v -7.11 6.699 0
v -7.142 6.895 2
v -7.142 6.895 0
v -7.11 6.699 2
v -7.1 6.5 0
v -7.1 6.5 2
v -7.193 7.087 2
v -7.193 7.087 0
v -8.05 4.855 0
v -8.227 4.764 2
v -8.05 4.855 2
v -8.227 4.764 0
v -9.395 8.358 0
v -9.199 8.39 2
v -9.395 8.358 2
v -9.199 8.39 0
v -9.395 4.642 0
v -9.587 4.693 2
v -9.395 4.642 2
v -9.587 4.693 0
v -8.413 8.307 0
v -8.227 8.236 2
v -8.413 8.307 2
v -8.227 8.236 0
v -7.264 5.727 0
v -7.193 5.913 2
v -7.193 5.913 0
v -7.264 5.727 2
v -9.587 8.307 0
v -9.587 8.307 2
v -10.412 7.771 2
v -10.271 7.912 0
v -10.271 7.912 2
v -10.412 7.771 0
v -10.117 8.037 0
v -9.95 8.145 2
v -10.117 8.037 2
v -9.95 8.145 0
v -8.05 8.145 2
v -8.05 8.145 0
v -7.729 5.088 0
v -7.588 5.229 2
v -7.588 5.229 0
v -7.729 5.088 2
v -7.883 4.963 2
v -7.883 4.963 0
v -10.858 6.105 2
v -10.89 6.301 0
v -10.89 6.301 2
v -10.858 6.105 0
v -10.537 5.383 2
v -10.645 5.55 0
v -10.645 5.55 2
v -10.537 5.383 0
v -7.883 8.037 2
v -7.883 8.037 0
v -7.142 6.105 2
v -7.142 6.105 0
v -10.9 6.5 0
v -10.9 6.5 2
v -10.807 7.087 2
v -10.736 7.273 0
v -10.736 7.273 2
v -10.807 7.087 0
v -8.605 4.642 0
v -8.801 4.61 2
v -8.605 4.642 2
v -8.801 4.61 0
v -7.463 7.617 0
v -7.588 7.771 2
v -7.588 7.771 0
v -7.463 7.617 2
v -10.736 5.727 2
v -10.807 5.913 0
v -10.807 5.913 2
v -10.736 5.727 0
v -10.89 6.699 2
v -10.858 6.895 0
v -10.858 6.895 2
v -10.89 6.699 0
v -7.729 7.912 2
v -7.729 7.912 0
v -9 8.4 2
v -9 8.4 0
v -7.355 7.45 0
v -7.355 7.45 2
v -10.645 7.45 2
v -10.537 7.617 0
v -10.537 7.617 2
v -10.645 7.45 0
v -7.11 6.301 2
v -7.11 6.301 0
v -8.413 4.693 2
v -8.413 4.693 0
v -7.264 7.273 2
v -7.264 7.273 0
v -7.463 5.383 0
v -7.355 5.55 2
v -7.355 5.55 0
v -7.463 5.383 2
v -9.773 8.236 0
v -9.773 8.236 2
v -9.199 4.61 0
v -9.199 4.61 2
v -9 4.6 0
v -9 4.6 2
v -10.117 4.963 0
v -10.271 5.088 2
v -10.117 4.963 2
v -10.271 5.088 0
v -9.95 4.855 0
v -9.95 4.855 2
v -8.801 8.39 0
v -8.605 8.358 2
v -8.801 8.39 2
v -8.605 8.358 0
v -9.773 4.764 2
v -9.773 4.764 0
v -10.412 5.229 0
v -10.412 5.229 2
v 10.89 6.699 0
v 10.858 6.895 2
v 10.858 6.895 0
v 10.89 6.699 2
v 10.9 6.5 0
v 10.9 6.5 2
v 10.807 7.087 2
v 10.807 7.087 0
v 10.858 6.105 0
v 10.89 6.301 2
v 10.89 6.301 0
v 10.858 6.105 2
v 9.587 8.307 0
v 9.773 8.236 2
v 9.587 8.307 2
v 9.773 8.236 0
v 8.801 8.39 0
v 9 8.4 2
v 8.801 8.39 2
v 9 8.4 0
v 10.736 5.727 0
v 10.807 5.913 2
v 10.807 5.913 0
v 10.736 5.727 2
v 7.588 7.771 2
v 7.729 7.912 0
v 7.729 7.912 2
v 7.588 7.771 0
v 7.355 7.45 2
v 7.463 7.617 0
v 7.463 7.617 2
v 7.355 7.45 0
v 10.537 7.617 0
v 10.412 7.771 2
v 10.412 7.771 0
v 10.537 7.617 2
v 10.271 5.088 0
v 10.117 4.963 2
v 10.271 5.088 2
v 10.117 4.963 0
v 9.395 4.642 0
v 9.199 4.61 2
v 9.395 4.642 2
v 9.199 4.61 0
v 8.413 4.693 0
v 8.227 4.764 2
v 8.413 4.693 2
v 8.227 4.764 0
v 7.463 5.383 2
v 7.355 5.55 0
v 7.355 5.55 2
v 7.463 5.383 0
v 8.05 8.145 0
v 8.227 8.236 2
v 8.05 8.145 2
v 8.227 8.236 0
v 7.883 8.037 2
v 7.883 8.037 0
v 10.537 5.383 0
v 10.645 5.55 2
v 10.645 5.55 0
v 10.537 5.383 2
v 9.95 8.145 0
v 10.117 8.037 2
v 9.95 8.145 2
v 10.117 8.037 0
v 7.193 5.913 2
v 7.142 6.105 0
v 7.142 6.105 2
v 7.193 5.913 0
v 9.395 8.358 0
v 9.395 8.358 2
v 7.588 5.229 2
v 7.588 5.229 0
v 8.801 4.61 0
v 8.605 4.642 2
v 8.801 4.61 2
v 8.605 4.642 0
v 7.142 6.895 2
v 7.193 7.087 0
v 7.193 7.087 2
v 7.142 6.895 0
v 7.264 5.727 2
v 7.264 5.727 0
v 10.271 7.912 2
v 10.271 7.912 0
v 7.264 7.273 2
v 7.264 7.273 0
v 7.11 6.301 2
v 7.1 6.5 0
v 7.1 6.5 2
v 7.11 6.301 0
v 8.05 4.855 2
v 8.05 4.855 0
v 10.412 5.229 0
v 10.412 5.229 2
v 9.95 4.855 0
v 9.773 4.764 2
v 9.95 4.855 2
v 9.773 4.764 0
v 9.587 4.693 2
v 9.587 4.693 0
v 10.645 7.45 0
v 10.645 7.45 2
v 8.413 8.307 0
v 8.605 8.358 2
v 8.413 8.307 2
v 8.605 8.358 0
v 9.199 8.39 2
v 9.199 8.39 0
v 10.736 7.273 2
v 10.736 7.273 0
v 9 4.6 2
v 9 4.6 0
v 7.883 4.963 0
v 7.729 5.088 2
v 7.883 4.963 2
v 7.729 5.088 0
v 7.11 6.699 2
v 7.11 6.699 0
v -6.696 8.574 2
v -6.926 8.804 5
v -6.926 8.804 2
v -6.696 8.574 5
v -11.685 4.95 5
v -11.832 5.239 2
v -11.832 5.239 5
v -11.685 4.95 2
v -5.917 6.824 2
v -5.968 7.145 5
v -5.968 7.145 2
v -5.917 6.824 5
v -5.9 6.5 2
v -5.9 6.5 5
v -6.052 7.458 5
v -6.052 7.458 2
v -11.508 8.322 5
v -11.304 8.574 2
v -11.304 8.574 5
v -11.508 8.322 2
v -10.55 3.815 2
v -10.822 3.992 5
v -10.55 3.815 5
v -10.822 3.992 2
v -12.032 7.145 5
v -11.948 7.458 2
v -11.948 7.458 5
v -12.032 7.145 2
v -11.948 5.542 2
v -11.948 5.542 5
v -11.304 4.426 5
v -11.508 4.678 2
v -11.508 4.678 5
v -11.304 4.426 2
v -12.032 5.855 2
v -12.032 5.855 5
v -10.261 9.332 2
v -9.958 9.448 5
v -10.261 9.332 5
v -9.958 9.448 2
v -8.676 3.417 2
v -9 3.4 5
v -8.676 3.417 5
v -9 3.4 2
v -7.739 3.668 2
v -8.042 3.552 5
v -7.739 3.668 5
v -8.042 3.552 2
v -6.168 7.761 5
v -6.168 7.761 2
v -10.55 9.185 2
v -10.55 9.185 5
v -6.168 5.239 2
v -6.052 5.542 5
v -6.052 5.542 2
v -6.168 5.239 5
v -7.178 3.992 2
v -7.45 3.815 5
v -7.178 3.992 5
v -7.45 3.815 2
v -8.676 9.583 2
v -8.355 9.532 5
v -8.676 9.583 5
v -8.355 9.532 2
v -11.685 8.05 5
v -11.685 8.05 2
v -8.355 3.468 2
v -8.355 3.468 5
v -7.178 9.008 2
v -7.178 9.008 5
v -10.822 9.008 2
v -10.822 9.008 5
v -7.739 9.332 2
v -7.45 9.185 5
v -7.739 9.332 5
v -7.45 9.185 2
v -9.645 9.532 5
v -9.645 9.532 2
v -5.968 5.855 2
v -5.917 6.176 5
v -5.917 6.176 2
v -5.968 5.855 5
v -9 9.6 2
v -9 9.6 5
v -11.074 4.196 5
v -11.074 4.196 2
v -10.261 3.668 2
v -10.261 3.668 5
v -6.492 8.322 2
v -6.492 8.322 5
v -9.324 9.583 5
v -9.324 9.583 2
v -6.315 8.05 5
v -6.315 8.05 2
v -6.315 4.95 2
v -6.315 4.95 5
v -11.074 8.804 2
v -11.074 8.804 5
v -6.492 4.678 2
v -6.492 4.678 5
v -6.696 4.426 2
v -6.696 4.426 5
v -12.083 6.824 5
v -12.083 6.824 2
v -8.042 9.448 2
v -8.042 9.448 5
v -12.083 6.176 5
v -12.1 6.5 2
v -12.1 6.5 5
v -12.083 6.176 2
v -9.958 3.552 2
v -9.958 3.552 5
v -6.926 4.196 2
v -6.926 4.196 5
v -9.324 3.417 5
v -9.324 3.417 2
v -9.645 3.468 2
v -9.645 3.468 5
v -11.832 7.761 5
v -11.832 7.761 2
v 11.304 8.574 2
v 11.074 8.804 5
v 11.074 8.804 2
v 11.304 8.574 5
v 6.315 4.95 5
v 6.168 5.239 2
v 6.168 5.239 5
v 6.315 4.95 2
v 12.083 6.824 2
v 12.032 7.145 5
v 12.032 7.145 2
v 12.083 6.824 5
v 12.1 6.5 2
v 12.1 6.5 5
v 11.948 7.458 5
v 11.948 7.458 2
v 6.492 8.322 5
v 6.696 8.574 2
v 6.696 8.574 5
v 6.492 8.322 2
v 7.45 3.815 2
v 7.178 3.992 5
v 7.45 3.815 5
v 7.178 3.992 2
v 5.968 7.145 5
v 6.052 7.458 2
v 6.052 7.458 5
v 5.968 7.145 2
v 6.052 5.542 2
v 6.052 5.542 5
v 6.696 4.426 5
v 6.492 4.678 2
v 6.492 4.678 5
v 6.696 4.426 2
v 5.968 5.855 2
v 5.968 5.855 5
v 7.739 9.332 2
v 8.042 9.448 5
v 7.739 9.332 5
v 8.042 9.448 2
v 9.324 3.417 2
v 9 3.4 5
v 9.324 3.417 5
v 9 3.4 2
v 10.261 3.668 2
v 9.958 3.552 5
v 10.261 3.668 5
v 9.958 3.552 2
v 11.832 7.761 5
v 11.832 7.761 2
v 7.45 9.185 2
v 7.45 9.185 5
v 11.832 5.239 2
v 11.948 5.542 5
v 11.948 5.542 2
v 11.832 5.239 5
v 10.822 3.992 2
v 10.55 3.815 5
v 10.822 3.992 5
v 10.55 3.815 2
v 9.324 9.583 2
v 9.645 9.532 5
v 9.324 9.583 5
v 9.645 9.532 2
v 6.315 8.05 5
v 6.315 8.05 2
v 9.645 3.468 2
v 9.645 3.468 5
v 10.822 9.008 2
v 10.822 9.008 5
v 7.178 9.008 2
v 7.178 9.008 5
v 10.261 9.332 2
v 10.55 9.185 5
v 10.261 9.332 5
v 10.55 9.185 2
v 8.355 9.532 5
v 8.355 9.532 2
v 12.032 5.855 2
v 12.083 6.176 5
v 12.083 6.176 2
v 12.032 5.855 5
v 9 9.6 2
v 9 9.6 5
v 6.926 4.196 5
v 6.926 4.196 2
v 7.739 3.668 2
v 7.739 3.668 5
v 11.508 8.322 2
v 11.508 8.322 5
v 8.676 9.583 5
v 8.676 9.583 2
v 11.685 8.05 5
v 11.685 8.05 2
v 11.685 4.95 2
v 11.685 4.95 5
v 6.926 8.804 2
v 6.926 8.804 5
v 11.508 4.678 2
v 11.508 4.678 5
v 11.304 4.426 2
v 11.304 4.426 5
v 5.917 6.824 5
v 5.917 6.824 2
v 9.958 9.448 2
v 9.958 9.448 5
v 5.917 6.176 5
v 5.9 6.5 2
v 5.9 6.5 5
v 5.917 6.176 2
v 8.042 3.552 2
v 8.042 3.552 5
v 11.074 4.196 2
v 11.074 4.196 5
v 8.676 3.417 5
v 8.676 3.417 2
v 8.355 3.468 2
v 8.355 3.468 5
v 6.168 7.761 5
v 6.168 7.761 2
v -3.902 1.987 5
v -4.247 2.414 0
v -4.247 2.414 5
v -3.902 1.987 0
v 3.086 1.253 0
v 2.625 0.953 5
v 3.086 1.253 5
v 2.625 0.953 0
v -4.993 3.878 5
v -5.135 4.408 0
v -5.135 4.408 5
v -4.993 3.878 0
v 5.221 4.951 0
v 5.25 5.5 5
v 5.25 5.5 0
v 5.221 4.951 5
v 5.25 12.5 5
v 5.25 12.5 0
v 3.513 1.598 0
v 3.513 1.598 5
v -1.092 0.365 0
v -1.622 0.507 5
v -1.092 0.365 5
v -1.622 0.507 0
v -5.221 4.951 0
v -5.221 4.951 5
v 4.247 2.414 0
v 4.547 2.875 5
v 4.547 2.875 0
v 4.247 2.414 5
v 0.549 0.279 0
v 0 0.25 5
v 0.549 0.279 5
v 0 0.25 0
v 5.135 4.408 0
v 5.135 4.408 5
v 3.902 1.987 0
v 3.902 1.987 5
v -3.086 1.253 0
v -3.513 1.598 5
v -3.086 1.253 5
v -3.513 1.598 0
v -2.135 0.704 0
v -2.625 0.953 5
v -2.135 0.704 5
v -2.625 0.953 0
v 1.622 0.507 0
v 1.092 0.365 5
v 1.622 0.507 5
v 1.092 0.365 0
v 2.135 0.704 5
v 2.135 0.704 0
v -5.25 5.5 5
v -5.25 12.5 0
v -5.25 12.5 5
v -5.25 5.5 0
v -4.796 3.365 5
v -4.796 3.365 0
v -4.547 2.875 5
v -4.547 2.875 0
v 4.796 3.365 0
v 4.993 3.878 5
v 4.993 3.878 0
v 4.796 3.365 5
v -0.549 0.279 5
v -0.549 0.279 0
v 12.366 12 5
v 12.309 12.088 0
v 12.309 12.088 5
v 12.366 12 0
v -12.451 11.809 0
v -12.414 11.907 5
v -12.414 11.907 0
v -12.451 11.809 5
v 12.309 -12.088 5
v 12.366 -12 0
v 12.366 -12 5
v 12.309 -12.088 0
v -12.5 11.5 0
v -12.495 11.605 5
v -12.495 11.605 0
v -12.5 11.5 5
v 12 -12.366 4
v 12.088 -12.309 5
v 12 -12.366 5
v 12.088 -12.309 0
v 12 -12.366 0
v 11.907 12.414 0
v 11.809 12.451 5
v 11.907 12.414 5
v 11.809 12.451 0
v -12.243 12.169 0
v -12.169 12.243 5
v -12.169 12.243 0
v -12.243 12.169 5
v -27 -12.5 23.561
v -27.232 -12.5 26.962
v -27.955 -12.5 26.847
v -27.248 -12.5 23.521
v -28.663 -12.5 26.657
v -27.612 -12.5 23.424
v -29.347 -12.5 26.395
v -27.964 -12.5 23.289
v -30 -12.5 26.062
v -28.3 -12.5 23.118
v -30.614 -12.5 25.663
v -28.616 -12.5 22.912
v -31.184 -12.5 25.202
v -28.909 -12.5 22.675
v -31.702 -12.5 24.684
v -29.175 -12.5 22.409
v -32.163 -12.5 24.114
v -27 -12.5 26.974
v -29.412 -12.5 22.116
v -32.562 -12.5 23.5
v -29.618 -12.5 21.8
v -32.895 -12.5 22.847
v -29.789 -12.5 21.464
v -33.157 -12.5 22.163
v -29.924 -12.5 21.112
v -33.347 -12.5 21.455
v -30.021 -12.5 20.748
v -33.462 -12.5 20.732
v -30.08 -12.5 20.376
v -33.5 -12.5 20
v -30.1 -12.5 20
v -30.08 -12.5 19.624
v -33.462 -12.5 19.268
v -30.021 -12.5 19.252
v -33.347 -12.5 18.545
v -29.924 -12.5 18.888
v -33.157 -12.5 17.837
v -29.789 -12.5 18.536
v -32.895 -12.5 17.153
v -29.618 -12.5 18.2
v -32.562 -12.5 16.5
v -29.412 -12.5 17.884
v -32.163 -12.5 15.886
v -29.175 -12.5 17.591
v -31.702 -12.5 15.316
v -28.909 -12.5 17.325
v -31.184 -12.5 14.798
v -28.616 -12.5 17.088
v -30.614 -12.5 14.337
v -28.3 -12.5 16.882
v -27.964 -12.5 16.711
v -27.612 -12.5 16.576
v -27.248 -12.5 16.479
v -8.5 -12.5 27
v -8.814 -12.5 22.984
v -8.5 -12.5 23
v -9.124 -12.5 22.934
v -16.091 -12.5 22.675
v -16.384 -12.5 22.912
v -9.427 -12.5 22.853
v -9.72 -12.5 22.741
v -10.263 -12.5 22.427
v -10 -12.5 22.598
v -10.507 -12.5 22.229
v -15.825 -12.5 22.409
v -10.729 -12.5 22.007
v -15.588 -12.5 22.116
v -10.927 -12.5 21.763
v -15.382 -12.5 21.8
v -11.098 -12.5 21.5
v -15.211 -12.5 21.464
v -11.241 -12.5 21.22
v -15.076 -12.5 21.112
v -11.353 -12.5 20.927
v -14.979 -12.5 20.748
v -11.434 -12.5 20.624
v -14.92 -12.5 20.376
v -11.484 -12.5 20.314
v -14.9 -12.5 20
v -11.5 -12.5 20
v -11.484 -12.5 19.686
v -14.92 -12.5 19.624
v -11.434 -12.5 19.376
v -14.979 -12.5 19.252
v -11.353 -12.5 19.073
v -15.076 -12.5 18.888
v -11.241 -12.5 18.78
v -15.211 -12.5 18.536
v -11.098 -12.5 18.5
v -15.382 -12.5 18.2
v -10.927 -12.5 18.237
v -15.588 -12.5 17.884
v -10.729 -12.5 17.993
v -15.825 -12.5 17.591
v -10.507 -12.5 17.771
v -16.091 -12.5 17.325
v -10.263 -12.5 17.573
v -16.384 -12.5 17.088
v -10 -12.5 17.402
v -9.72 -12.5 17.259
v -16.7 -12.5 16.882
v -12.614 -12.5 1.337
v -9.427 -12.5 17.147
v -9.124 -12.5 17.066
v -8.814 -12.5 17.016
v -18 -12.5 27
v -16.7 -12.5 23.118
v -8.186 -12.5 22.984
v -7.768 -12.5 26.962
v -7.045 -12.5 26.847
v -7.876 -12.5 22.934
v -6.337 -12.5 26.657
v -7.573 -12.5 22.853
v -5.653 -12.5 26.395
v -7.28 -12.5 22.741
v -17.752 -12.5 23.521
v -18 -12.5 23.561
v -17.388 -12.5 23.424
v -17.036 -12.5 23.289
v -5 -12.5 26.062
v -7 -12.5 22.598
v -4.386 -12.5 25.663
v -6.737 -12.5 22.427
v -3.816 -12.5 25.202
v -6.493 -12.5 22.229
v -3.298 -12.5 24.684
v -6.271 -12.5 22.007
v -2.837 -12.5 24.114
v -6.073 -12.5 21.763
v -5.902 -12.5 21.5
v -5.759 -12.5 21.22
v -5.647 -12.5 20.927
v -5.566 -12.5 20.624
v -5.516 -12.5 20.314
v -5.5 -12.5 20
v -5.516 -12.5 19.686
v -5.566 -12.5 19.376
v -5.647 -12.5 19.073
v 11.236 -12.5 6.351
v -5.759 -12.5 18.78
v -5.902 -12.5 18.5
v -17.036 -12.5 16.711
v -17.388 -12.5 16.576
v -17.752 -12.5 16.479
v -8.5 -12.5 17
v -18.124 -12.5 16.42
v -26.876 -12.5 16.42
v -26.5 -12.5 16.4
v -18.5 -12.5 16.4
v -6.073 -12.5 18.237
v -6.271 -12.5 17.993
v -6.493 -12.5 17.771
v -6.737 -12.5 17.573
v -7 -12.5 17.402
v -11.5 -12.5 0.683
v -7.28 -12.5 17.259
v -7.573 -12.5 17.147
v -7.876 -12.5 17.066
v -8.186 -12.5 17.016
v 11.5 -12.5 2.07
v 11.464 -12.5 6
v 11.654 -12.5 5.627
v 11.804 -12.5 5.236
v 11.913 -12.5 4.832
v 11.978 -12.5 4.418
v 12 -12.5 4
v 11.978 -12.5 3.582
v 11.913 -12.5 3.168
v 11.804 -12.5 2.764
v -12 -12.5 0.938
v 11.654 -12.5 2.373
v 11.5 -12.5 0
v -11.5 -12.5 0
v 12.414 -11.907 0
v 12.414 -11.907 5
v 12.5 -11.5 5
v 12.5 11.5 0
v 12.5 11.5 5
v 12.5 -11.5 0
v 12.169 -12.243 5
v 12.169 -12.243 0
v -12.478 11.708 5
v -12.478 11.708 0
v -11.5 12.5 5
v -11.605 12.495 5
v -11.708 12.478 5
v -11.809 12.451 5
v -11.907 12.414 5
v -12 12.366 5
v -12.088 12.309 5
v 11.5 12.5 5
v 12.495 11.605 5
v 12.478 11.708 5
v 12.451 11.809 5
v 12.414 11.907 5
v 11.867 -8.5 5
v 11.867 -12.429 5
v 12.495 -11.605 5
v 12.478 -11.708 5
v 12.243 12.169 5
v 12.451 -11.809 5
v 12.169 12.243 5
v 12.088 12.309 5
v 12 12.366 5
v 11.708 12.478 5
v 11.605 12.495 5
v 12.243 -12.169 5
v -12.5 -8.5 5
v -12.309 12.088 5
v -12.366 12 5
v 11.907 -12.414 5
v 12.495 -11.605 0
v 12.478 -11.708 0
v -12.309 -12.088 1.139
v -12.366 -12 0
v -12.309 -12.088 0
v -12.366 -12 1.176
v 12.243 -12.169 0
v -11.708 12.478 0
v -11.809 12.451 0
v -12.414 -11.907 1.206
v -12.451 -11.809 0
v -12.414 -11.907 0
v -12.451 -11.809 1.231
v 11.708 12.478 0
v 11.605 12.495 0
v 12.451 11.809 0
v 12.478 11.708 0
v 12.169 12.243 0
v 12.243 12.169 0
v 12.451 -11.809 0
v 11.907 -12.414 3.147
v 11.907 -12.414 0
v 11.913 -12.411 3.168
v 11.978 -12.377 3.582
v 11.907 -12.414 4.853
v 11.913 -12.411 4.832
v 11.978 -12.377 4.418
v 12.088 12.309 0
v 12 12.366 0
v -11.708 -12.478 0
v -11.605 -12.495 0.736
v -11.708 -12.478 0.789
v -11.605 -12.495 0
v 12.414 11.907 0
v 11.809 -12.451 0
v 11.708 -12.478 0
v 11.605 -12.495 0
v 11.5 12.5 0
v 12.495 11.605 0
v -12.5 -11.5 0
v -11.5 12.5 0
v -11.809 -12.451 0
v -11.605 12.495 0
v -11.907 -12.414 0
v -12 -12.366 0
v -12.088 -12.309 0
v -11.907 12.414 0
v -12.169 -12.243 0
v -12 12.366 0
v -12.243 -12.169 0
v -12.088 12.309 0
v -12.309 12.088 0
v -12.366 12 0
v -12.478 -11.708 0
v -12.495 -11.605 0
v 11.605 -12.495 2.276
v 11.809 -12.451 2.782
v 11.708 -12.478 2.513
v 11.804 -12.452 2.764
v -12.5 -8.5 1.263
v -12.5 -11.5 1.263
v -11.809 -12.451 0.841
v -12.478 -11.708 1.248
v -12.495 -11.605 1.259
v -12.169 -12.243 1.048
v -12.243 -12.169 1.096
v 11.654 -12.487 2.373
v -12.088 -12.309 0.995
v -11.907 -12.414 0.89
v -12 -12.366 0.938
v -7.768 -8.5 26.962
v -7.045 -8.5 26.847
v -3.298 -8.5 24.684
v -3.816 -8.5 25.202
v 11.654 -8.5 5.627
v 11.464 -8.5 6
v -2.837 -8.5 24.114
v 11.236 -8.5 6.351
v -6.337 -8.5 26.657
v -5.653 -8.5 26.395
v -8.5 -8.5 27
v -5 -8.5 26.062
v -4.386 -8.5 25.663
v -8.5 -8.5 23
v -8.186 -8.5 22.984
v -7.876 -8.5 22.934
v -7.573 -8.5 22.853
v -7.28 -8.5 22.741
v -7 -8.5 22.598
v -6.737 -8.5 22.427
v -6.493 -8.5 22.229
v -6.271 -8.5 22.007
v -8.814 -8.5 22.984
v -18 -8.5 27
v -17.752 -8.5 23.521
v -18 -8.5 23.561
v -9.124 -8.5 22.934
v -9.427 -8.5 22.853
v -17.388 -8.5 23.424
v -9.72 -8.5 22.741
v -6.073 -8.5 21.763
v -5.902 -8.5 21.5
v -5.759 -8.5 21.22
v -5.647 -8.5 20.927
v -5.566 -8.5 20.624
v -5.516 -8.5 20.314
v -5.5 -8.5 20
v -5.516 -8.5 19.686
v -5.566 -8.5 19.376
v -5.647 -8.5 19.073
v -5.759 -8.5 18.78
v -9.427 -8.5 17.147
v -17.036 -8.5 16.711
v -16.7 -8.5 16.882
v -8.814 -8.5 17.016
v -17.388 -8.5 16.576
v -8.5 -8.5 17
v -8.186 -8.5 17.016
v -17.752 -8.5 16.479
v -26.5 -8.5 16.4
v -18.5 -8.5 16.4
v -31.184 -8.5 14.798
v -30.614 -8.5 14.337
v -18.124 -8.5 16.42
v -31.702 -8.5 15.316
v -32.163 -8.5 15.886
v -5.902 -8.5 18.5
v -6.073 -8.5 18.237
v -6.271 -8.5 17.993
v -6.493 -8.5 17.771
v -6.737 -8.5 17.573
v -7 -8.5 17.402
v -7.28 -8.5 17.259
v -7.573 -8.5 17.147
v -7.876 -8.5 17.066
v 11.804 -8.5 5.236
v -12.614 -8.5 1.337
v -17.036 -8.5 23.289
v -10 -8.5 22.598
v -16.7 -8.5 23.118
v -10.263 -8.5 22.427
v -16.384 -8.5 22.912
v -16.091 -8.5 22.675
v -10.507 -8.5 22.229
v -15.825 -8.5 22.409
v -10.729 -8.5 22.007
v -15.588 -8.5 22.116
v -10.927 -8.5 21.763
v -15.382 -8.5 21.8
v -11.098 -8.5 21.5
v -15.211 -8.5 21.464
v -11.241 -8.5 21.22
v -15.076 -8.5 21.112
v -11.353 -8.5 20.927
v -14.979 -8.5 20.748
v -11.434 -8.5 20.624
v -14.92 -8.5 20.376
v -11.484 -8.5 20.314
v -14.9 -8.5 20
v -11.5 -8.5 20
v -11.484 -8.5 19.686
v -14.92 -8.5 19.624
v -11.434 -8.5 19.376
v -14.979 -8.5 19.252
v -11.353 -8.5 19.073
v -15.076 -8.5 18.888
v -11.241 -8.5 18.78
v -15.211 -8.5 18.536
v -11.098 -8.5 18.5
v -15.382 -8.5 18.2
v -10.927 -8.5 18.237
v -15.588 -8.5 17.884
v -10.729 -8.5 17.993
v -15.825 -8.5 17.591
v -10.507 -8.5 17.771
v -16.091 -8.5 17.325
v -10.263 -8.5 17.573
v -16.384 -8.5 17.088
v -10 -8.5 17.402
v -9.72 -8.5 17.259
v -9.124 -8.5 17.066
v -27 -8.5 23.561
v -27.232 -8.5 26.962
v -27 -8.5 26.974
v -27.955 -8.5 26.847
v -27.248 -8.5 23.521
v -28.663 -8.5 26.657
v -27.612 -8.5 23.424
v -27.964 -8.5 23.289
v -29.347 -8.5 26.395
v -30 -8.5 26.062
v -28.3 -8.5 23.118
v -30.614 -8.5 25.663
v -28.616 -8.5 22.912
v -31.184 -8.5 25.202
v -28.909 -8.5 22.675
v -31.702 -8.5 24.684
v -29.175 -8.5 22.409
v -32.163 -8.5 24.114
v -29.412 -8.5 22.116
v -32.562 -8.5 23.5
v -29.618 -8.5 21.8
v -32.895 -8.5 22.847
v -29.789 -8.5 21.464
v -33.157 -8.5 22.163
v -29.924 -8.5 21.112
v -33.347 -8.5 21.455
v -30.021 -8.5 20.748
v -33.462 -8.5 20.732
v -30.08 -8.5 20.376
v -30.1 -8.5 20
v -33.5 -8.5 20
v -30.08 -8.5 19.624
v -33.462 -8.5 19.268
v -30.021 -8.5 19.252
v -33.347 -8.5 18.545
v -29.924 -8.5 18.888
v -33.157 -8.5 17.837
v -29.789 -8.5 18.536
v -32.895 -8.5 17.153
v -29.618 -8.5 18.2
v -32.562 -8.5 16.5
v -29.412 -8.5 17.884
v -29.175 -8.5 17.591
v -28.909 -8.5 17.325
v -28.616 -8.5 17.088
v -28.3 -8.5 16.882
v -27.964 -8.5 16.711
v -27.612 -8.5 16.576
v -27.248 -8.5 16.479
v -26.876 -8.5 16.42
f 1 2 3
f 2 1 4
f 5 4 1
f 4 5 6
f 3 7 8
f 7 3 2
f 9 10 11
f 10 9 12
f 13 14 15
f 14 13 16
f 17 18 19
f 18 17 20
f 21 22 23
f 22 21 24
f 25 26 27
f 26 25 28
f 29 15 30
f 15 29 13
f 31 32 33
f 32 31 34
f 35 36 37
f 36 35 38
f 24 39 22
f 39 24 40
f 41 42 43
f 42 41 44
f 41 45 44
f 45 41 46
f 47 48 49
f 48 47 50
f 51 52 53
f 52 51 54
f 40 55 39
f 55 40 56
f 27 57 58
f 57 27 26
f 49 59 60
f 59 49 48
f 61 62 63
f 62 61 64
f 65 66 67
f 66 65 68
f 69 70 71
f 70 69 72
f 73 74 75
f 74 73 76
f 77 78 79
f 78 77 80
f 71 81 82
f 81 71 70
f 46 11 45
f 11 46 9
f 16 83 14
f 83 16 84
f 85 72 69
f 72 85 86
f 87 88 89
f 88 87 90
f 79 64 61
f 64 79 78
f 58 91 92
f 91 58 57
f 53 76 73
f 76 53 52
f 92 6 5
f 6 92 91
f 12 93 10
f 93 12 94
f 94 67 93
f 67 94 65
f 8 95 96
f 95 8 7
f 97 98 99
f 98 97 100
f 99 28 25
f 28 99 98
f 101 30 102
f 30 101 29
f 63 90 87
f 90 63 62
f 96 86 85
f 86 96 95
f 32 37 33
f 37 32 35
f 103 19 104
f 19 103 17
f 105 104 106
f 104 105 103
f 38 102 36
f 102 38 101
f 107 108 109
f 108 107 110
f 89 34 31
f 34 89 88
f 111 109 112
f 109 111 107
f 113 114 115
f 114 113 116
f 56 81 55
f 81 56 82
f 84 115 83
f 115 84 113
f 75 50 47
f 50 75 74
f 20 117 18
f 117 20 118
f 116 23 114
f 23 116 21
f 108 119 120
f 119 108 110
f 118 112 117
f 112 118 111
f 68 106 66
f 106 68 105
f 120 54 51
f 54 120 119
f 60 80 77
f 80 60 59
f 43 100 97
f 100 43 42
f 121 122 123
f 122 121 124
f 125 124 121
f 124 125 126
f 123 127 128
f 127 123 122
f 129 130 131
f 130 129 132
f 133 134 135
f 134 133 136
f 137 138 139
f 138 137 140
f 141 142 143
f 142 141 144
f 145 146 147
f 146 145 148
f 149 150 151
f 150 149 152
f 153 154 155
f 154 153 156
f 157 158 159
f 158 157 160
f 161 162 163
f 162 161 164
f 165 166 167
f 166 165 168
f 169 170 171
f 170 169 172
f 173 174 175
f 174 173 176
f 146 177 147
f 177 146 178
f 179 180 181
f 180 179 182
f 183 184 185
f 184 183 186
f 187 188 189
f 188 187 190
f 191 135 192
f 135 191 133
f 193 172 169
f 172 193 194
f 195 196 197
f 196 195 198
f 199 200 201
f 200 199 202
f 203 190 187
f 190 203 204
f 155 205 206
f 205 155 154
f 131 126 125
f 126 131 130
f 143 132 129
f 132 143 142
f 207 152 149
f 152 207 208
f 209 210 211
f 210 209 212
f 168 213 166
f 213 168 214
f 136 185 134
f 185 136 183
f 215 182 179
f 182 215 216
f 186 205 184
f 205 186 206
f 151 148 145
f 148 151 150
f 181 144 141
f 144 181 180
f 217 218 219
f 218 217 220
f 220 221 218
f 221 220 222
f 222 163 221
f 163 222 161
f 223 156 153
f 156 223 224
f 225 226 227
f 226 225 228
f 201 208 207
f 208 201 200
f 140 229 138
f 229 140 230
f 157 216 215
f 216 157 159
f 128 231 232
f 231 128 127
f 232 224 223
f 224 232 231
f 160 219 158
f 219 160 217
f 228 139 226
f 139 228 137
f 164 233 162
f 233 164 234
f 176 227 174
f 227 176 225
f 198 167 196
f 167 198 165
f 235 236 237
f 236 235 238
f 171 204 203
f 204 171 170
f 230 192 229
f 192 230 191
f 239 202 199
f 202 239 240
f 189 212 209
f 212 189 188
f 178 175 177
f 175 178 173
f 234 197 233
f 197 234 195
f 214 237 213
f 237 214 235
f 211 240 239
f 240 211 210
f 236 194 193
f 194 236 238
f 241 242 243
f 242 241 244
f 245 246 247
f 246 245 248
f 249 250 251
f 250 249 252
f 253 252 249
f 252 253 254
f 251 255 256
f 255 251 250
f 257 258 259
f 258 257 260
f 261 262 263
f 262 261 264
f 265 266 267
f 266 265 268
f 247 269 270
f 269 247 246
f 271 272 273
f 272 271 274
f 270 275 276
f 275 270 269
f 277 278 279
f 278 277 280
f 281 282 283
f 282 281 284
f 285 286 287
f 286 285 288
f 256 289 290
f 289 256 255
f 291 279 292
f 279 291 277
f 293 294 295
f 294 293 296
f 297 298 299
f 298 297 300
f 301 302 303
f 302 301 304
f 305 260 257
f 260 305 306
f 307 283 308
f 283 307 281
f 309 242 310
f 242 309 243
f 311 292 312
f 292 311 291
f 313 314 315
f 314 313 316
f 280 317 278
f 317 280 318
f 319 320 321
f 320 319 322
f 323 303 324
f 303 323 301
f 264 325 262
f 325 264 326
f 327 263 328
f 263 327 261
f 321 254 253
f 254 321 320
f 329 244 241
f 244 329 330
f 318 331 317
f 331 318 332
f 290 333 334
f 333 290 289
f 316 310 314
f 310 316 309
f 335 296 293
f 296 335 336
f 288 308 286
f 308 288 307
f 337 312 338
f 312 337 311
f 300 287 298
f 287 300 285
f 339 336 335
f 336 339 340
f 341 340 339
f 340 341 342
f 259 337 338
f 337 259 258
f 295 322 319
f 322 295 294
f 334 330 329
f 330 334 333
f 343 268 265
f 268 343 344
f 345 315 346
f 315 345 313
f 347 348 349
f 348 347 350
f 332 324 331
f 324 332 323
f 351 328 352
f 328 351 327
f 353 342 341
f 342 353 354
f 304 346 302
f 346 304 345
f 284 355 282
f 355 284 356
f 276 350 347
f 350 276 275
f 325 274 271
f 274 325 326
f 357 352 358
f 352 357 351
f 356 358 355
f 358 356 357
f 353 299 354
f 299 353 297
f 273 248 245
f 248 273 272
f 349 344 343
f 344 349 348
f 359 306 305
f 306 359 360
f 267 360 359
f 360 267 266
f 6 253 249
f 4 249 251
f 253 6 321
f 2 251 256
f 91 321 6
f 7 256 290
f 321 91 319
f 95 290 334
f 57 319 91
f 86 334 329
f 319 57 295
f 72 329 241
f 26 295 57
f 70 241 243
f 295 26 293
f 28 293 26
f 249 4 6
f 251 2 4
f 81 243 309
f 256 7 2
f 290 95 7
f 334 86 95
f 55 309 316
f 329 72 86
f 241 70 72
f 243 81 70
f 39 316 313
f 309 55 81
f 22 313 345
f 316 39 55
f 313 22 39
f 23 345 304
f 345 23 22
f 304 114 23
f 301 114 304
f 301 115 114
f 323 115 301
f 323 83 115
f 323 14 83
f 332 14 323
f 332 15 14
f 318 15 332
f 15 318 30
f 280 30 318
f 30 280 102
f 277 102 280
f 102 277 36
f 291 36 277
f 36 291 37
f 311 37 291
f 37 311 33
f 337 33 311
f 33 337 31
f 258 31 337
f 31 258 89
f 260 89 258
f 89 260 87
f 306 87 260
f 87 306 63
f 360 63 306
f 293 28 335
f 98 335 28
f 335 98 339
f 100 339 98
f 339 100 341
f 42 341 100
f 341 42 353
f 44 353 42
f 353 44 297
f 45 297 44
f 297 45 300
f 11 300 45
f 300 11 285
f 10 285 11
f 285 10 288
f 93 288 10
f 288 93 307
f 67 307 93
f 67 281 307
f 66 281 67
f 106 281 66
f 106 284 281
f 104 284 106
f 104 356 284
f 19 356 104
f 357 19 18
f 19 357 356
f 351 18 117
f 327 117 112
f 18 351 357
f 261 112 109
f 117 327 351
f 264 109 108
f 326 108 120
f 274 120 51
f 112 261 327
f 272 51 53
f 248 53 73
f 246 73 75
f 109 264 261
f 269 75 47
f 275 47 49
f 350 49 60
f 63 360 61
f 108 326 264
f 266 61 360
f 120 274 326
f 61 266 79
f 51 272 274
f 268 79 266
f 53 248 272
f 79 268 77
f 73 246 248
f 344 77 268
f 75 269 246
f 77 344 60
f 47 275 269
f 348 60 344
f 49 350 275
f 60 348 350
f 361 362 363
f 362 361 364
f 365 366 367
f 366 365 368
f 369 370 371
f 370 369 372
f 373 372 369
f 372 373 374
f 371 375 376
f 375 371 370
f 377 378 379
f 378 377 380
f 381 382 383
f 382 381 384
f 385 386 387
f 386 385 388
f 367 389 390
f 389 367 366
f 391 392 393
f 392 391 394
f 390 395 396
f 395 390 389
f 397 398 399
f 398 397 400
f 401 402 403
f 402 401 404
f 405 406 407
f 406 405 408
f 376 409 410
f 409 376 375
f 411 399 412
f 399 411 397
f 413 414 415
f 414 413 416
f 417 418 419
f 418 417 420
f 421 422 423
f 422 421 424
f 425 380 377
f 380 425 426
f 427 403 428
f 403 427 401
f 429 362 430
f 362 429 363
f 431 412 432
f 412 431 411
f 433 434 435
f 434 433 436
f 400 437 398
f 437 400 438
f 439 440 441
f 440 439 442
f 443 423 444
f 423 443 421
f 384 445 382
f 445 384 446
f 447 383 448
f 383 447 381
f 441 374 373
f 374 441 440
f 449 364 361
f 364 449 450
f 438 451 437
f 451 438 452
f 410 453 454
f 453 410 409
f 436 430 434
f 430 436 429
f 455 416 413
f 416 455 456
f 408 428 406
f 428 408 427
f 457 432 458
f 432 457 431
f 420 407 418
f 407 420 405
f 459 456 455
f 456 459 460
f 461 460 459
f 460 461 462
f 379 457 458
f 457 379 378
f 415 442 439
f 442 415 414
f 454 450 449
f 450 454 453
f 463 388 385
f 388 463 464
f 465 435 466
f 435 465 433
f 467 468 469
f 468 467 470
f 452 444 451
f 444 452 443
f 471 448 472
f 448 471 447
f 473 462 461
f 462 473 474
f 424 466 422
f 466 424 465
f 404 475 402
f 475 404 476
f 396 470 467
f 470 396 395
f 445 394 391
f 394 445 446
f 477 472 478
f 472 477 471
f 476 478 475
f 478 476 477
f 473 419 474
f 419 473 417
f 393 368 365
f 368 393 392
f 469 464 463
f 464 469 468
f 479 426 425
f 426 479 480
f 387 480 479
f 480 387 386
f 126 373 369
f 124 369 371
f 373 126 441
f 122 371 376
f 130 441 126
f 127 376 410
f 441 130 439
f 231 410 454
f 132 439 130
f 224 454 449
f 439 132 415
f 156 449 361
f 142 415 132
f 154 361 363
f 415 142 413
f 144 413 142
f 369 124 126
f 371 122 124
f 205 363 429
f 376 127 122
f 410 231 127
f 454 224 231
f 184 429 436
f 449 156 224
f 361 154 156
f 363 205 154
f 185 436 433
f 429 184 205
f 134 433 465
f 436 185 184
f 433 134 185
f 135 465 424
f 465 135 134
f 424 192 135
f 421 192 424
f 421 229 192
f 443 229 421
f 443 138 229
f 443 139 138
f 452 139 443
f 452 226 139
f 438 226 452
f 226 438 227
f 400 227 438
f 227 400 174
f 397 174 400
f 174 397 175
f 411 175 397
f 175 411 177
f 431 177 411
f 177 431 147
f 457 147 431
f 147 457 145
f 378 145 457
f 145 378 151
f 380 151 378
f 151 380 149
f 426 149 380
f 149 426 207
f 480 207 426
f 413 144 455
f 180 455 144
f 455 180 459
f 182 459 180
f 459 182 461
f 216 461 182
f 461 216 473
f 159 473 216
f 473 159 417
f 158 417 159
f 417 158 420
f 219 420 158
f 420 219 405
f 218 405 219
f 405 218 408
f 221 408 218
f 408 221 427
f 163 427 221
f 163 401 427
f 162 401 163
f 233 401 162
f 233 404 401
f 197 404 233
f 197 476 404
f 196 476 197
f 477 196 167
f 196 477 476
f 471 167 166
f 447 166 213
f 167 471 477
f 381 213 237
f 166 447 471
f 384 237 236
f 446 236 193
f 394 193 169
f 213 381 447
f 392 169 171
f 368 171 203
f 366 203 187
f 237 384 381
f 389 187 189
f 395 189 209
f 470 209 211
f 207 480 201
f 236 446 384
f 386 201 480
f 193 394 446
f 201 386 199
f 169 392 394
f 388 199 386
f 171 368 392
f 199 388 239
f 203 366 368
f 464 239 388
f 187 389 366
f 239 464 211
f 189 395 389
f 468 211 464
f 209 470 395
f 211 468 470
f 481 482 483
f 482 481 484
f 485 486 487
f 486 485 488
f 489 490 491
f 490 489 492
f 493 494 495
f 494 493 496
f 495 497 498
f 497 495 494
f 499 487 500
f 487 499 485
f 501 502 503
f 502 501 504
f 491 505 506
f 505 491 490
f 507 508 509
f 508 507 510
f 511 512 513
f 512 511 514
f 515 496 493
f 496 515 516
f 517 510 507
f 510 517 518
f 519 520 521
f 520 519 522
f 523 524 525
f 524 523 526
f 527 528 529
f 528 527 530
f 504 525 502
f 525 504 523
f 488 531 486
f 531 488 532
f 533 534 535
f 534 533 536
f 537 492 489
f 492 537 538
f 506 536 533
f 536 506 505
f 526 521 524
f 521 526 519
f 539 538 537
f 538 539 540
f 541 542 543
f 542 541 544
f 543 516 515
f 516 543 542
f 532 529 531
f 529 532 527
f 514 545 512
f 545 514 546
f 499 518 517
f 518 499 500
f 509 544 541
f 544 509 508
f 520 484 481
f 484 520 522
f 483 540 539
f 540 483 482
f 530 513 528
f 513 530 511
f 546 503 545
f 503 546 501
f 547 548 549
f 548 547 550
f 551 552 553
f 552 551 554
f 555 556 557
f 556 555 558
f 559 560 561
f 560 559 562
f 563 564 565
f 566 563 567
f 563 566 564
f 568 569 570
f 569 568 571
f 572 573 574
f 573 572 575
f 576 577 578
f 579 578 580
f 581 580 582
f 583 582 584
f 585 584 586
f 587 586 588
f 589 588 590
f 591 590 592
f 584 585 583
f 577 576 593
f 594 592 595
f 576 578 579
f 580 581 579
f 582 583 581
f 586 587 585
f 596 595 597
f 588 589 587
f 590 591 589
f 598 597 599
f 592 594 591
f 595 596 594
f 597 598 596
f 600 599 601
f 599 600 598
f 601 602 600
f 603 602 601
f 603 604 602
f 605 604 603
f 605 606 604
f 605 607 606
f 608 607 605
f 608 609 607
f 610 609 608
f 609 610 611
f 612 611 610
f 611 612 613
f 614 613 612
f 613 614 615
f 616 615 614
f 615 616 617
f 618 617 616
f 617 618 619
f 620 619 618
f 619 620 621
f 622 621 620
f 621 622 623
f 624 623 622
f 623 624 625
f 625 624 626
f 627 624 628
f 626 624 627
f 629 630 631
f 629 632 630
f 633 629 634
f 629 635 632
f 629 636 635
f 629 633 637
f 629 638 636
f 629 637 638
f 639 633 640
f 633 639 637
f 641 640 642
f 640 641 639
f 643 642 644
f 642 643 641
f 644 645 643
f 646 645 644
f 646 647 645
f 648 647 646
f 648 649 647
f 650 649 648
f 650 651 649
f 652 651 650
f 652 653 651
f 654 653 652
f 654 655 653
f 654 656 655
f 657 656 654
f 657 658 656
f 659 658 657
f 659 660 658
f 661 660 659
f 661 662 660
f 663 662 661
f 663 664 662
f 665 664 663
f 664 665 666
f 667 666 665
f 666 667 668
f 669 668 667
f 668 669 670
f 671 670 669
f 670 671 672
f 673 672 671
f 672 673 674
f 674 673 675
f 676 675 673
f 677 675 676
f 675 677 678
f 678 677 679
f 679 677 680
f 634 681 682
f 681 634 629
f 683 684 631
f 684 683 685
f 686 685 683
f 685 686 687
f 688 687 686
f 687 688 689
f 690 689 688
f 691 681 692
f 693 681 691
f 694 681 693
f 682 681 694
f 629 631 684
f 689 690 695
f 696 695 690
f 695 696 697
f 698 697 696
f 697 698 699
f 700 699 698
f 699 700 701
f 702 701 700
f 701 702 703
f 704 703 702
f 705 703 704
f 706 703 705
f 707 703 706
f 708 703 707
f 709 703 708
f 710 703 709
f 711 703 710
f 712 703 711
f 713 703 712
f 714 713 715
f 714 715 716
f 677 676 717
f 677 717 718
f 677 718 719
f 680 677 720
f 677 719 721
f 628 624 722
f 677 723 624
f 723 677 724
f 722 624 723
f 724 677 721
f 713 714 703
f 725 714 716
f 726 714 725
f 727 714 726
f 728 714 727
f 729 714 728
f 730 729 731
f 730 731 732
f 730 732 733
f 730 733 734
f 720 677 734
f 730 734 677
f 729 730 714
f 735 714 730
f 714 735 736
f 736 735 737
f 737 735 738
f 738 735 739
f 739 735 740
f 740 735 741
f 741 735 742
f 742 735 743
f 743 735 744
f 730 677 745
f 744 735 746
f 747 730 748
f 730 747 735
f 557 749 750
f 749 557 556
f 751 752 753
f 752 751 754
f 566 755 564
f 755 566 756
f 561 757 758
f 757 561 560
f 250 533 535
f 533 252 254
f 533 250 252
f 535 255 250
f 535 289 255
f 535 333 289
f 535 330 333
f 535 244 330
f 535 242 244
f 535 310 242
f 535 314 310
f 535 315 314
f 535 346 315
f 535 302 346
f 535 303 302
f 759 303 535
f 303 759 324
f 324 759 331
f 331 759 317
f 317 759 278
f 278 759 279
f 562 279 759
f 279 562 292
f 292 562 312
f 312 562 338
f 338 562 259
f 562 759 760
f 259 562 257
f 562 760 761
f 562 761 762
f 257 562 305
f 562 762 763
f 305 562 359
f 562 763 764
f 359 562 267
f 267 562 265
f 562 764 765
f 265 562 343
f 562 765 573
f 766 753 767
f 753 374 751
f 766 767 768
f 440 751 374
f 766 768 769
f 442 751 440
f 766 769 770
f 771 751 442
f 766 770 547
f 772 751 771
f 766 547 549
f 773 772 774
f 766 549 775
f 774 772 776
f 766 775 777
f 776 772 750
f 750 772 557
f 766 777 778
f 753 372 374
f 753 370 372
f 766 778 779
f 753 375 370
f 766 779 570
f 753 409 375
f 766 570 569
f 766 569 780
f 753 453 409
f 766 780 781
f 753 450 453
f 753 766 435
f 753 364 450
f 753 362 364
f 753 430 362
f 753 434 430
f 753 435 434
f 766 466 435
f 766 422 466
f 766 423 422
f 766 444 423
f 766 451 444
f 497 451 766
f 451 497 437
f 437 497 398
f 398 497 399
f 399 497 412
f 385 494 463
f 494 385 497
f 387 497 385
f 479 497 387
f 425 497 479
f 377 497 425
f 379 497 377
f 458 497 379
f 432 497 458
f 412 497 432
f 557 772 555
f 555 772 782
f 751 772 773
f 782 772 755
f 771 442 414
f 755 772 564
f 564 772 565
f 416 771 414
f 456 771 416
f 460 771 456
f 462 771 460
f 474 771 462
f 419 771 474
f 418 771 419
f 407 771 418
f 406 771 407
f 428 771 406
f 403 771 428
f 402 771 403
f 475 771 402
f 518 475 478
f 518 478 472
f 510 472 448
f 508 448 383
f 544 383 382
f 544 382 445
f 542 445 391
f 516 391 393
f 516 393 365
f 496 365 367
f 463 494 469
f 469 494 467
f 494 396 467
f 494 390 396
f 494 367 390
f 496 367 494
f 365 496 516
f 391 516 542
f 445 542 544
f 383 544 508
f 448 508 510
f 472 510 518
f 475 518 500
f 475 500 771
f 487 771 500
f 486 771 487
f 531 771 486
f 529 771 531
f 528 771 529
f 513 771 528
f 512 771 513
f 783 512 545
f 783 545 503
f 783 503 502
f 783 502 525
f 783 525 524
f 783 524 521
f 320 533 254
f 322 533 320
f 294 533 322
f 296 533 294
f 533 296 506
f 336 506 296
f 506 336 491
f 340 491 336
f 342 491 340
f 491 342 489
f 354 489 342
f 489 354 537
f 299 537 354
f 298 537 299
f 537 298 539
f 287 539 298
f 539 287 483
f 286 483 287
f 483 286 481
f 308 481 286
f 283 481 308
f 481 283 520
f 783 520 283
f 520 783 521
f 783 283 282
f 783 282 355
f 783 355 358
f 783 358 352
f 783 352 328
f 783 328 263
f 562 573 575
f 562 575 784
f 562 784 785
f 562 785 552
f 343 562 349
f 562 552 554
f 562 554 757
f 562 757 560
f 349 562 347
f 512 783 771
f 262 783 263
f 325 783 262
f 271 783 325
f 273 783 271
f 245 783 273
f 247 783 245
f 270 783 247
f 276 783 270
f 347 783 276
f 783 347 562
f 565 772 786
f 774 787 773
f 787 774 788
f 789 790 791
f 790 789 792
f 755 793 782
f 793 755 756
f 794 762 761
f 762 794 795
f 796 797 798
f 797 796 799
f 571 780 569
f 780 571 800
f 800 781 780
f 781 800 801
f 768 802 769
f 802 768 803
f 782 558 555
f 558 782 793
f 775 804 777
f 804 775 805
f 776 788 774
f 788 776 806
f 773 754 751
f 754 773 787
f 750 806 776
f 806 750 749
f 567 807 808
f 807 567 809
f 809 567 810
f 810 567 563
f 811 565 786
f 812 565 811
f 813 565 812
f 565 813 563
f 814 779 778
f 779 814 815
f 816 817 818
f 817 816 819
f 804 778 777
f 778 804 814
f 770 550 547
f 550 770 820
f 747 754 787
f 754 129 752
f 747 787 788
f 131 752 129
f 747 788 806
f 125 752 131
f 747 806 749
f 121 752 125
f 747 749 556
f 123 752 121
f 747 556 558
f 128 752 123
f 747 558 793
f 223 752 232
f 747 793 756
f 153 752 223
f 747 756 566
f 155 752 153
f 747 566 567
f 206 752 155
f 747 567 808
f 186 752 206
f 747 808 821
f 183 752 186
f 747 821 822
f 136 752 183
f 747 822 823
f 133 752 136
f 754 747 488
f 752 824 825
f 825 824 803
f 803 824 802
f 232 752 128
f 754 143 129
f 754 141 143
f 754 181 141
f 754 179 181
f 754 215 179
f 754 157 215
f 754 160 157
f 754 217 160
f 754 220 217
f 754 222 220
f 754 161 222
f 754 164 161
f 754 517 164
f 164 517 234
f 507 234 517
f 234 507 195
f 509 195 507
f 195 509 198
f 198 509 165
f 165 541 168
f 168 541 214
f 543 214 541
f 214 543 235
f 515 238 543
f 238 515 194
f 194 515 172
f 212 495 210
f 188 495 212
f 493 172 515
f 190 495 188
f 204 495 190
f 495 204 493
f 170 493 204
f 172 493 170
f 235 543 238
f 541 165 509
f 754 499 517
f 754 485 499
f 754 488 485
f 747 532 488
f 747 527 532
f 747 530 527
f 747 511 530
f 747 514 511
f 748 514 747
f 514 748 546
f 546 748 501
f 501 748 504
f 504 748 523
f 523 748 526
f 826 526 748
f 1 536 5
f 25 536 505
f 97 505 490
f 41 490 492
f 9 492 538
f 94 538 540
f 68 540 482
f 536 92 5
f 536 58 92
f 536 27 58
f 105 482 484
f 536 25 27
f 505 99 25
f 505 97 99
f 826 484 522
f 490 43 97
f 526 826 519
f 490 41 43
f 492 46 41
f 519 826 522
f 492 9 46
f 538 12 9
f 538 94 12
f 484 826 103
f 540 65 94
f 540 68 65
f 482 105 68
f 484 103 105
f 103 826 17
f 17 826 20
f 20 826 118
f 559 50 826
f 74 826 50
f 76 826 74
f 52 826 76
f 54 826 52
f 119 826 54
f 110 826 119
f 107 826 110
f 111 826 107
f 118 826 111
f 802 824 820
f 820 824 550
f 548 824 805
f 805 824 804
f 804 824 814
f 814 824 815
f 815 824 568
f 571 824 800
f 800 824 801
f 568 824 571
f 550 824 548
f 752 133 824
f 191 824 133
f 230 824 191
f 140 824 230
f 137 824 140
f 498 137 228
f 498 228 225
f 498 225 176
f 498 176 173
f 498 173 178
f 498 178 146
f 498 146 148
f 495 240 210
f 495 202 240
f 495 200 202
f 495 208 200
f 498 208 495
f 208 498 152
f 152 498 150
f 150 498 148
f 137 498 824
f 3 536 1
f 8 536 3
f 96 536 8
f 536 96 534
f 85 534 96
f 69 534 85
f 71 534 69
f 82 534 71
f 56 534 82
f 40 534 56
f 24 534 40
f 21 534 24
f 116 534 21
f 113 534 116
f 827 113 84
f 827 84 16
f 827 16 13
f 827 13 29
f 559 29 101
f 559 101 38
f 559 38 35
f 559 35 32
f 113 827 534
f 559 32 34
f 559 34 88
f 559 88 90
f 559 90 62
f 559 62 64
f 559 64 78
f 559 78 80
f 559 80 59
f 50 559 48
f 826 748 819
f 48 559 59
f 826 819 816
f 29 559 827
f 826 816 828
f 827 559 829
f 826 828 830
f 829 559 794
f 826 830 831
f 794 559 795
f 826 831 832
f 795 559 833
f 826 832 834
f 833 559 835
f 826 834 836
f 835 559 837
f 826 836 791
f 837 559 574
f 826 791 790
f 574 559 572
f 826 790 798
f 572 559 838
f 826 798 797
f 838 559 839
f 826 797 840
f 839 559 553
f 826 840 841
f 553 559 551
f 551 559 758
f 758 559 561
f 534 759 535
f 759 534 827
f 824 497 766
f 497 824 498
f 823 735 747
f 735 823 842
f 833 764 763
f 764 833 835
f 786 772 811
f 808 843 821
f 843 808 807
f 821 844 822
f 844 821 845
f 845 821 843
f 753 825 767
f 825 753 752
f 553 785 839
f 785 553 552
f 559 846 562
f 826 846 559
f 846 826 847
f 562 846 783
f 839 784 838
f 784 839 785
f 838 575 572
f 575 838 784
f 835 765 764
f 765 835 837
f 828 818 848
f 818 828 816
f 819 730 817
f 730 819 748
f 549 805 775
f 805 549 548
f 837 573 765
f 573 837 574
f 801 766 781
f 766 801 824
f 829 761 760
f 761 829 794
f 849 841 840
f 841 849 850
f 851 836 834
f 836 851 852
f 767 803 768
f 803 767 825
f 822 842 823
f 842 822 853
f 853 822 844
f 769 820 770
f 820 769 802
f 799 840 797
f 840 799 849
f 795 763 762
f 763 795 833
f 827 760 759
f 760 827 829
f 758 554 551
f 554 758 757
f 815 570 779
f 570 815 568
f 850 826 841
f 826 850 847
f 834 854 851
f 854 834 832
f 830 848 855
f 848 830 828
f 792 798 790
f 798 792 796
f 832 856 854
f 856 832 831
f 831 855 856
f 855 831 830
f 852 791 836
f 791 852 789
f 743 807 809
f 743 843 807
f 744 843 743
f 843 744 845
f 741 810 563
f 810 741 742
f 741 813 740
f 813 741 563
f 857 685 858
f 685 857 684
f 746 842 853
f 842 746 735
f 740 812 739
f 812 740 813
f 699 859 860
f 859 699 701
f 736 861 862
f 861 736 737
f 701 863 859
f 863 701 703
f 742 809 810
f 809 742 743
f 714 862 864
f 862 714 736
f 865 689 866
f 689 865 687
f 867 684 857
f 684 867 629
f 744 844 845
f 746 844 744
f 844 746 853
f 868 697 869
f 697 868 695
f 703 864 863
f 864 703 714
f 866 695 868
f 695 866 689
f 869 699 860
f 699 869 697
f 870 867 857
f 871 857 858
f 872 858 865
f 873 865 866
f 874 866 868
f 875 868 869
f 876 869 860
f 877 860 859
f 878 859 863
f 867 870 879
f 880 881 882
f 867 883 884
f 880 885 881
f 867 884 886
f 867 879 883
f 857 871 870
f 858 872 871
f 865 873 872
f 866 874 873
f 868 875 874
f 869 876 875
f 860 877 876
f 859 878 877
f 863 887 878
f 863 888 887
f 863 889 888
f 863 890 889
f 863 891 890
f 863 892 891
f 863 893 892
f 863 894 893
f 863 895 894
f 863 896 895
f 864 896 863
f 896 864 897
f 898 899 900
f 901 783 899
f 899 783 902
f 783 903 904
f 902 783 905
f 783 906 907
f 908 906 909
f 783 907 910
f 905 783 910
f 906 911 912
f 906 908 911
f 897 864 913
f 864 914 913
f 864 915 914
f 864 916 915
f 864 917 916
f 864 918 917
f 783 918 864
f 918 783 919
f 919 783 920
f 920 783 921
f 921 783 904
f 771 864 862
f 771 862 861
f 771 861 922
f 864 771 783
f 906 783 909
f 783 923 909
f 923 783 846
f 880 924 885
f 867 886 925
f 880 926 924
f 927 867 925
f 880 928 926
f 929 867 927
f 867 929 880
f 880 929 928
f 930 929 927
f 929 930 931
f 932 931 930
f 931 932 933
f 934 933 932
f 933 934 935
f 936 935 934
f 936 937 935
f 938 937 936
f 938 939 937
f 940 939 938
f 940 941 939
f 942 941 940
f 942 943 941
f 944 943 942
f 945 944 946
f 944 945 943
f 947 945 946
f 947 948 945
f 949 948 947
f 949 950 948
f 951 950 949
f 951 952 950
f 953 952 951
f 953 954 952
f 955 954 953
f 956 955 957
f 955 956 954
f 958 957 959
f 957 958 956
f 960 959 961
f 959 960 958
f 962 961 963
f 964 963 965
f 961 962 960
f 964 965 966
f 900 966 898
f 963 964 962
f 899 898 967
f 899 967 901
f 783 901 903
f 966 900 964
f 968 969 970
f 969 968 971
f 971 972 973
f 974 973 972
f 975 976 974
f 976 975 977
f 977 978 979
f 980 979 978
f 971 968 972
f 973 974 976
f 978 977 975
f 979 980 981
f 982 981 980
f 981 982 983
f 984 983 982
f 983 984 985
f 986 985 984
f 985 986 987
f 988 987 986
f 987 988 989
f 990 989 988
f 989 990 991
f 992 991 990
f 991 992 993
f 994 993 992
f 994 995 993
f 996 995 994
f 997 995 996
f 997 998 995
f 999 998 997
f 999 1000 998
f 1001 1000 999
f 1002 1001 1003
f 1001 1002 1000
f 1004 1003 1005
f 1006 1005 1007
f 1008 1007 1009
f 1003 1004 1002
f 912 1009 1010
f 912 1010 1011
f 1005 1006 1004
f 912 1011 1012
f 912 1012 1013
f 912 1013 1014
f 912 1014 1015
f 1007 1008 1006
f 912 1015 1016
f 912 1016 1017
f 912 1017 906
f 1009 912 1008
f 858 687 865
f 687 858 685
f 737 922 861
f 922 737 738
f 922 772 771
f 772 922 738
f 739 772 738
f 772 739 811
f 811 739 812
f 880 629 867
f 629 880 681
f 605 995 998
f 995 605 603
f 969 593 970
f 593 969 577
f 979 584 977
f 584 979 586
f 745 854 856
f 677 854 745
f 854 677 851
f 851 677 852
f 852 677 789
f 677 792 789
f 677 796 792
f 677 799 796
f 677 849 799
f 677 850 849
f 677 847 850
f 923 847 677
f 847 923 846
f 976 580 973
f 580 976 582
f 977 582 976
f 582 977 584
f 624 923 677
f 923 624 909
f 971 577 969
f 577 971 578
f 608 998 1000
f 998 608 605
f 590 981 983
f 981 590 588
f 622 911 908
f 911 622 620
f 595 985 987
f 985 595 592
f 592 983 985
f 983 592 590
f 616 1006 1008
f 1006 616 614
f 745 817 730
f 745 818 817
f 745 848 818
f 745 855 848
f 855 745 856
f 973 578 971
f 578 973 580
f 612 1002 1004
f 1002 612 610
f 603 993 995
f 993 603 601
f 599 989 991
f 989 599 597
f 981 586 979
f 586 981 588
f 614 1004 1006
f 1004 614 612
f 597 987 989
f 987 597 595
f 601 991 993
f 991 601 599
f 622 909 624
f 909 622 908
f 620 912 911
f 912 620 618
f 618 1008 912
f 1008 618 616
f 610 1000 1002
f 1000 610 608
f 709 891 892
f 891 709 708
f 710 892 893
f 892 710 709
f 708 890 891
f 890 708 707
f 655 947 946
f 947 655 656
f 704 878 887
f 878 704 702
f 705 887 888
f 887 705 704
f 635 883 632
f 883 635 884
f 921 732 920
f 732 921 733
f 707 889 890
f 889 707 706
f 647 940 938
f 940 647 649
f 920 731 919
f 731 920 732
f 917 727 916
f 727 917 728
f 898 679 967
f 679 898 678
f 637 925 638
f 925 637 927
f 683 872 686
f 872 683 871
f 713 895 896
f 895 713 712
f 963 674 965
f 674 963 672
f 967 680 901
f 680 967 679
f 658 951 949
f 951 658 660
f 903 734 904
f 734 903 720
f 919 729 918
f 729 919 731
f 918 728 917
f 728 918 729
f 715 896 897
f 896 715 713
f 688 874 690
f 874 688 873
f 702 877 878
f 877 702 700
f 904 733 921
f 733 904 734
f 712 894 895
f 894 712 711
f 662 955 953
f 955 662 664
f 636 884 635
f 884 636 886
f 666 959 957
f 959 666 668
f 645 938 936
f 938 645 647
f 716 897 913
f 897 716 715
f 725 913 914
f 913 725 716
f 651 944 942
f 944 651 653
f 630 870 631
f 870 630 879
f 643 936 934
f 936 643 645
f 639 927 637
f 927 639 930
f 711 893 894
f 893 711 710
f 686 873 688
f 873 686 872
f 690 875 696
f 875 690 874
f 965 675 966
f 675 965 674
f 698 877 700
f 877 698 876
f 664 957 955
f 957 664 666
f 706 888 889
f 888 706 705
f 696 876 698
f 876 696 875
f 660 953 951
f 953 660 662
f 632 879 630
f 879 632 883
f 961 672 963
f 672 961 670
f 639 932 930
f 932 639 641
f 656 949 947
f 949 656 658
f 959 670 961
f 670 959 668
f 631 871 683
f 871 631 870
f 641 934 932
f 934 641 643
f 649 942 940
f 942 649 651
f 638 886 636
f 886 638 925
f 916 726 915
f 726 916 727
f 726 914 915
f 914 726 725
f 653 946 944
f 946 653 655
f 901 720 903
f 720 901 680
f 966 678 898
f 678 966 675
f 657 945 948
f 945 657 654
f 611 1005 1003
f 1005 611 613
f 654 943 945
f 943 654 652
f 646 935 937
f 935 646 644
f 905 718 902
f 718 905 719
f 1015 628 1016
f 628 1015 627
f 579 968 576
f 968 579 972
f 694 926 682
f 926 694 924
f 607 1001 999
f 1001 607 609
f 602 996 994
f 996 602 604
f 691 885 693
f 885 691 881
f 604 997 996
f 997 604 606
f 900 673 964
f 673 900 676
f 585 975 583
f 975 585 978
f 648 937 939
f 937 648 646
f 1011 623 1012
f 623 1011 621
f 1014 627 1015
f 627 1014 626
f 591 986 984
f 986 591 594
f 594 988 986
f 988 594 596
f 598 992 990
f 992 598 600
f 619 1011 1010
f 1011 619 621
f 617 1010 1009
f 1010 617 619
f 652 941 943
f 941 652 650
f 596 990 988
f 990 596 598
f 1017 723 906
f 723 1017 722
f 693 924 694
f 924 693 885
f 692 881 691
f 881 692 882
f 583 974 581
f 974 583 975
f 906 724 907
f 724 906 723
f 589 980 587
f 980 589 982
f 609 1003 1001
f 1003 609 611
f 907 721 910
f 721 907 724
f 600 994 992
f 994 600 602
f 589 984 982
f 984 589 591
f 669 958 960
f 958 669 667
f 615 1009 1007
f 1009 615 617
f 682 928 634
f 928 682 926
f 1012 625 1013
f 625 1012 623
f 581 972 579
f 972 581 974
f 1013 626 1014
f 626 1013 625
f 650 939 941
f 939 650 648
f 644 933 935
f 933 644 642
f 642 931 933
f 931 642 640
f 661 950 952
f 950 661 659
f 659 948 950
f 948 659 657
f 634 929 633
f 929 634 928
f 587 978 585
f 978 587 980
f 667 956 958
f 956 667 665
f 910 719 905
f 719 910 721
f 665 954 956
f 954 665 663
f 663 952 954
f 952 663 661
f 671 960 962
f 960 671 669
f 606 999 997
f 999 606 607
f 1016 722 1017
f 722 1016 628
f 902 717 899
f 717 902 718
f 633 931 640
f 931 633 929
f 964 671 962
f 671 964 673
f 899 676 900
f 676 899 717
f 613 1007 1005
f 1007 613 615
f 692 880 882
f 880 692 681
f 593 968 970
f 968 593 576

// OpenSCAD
$fn=60;
width=25;
length=25;
height=5;
rad=1;
offset=7;
hole_center=18;
difference(){
    hull() for(X=[-1,1], Y=[-1,1]) 
        translate([(width-rad*2)/2*X, (length-rad*2)/2*Y, 0]) 
            cylinder(r=rad, h=height);
    translate([0, (length/2)-offset, -1]){
        hull(){
            cylinder(h=height*2, d=10.5);
            translate([-5.25, length-offset, -1]) 
                cube([10.5, 1, height*2]);
        }
        for(X=[-1,1]) translate([(hole_center/2)*X,1,0]) 
            cylinder(d=3.8, h=height*2);
        for(X=[-1,1]) translate([(hole_center/2)*X,1,3]) 
            cylinder(d=6.2, h=height*2);
    }
}
difference(){
    translate([-10, -8.5, 20]){
            hull(){
            translate([1.5, 0, 0]) rotate([90,0,0]) 
                cylinder(d=14, h=4);
            translate([1.5, 0, -15]) rotate([90,0,0]) 
                cylinder(d=8, h=4);
            translate([18, 0, -16]) rotate([90,0,0]) 
                cylinder(d=8, h=4);
        }
        hull(){
            translate([1.5, 0, 0]) rotate([90,0,0]) 
                cylinder(d=14, h=4);
            translate([1.5, 0, -13]) rotate([90,0,0]) 
                cylinder(d=14, h=4);
            translate([1.5-18, 0, 0]) rotate([90,0,0]) 
                cylinder(d=14, h=4);
        }
    }
    translate([-8.5, -4, 20]) rotate([90,0,0]) cylinder(d=6, h=10);
    translate([-8.5-10, -4, 20]) 
        hull(){
            rotate([90,0,0]) cylinder(d=7.2, h=10);
            translate([-8, 0, 0])rotate([90,0,0]) cylinder(d=7.2, h=10);
        }
    translate([-27, -15, 18]) cube([9, 10, 10]);
}
